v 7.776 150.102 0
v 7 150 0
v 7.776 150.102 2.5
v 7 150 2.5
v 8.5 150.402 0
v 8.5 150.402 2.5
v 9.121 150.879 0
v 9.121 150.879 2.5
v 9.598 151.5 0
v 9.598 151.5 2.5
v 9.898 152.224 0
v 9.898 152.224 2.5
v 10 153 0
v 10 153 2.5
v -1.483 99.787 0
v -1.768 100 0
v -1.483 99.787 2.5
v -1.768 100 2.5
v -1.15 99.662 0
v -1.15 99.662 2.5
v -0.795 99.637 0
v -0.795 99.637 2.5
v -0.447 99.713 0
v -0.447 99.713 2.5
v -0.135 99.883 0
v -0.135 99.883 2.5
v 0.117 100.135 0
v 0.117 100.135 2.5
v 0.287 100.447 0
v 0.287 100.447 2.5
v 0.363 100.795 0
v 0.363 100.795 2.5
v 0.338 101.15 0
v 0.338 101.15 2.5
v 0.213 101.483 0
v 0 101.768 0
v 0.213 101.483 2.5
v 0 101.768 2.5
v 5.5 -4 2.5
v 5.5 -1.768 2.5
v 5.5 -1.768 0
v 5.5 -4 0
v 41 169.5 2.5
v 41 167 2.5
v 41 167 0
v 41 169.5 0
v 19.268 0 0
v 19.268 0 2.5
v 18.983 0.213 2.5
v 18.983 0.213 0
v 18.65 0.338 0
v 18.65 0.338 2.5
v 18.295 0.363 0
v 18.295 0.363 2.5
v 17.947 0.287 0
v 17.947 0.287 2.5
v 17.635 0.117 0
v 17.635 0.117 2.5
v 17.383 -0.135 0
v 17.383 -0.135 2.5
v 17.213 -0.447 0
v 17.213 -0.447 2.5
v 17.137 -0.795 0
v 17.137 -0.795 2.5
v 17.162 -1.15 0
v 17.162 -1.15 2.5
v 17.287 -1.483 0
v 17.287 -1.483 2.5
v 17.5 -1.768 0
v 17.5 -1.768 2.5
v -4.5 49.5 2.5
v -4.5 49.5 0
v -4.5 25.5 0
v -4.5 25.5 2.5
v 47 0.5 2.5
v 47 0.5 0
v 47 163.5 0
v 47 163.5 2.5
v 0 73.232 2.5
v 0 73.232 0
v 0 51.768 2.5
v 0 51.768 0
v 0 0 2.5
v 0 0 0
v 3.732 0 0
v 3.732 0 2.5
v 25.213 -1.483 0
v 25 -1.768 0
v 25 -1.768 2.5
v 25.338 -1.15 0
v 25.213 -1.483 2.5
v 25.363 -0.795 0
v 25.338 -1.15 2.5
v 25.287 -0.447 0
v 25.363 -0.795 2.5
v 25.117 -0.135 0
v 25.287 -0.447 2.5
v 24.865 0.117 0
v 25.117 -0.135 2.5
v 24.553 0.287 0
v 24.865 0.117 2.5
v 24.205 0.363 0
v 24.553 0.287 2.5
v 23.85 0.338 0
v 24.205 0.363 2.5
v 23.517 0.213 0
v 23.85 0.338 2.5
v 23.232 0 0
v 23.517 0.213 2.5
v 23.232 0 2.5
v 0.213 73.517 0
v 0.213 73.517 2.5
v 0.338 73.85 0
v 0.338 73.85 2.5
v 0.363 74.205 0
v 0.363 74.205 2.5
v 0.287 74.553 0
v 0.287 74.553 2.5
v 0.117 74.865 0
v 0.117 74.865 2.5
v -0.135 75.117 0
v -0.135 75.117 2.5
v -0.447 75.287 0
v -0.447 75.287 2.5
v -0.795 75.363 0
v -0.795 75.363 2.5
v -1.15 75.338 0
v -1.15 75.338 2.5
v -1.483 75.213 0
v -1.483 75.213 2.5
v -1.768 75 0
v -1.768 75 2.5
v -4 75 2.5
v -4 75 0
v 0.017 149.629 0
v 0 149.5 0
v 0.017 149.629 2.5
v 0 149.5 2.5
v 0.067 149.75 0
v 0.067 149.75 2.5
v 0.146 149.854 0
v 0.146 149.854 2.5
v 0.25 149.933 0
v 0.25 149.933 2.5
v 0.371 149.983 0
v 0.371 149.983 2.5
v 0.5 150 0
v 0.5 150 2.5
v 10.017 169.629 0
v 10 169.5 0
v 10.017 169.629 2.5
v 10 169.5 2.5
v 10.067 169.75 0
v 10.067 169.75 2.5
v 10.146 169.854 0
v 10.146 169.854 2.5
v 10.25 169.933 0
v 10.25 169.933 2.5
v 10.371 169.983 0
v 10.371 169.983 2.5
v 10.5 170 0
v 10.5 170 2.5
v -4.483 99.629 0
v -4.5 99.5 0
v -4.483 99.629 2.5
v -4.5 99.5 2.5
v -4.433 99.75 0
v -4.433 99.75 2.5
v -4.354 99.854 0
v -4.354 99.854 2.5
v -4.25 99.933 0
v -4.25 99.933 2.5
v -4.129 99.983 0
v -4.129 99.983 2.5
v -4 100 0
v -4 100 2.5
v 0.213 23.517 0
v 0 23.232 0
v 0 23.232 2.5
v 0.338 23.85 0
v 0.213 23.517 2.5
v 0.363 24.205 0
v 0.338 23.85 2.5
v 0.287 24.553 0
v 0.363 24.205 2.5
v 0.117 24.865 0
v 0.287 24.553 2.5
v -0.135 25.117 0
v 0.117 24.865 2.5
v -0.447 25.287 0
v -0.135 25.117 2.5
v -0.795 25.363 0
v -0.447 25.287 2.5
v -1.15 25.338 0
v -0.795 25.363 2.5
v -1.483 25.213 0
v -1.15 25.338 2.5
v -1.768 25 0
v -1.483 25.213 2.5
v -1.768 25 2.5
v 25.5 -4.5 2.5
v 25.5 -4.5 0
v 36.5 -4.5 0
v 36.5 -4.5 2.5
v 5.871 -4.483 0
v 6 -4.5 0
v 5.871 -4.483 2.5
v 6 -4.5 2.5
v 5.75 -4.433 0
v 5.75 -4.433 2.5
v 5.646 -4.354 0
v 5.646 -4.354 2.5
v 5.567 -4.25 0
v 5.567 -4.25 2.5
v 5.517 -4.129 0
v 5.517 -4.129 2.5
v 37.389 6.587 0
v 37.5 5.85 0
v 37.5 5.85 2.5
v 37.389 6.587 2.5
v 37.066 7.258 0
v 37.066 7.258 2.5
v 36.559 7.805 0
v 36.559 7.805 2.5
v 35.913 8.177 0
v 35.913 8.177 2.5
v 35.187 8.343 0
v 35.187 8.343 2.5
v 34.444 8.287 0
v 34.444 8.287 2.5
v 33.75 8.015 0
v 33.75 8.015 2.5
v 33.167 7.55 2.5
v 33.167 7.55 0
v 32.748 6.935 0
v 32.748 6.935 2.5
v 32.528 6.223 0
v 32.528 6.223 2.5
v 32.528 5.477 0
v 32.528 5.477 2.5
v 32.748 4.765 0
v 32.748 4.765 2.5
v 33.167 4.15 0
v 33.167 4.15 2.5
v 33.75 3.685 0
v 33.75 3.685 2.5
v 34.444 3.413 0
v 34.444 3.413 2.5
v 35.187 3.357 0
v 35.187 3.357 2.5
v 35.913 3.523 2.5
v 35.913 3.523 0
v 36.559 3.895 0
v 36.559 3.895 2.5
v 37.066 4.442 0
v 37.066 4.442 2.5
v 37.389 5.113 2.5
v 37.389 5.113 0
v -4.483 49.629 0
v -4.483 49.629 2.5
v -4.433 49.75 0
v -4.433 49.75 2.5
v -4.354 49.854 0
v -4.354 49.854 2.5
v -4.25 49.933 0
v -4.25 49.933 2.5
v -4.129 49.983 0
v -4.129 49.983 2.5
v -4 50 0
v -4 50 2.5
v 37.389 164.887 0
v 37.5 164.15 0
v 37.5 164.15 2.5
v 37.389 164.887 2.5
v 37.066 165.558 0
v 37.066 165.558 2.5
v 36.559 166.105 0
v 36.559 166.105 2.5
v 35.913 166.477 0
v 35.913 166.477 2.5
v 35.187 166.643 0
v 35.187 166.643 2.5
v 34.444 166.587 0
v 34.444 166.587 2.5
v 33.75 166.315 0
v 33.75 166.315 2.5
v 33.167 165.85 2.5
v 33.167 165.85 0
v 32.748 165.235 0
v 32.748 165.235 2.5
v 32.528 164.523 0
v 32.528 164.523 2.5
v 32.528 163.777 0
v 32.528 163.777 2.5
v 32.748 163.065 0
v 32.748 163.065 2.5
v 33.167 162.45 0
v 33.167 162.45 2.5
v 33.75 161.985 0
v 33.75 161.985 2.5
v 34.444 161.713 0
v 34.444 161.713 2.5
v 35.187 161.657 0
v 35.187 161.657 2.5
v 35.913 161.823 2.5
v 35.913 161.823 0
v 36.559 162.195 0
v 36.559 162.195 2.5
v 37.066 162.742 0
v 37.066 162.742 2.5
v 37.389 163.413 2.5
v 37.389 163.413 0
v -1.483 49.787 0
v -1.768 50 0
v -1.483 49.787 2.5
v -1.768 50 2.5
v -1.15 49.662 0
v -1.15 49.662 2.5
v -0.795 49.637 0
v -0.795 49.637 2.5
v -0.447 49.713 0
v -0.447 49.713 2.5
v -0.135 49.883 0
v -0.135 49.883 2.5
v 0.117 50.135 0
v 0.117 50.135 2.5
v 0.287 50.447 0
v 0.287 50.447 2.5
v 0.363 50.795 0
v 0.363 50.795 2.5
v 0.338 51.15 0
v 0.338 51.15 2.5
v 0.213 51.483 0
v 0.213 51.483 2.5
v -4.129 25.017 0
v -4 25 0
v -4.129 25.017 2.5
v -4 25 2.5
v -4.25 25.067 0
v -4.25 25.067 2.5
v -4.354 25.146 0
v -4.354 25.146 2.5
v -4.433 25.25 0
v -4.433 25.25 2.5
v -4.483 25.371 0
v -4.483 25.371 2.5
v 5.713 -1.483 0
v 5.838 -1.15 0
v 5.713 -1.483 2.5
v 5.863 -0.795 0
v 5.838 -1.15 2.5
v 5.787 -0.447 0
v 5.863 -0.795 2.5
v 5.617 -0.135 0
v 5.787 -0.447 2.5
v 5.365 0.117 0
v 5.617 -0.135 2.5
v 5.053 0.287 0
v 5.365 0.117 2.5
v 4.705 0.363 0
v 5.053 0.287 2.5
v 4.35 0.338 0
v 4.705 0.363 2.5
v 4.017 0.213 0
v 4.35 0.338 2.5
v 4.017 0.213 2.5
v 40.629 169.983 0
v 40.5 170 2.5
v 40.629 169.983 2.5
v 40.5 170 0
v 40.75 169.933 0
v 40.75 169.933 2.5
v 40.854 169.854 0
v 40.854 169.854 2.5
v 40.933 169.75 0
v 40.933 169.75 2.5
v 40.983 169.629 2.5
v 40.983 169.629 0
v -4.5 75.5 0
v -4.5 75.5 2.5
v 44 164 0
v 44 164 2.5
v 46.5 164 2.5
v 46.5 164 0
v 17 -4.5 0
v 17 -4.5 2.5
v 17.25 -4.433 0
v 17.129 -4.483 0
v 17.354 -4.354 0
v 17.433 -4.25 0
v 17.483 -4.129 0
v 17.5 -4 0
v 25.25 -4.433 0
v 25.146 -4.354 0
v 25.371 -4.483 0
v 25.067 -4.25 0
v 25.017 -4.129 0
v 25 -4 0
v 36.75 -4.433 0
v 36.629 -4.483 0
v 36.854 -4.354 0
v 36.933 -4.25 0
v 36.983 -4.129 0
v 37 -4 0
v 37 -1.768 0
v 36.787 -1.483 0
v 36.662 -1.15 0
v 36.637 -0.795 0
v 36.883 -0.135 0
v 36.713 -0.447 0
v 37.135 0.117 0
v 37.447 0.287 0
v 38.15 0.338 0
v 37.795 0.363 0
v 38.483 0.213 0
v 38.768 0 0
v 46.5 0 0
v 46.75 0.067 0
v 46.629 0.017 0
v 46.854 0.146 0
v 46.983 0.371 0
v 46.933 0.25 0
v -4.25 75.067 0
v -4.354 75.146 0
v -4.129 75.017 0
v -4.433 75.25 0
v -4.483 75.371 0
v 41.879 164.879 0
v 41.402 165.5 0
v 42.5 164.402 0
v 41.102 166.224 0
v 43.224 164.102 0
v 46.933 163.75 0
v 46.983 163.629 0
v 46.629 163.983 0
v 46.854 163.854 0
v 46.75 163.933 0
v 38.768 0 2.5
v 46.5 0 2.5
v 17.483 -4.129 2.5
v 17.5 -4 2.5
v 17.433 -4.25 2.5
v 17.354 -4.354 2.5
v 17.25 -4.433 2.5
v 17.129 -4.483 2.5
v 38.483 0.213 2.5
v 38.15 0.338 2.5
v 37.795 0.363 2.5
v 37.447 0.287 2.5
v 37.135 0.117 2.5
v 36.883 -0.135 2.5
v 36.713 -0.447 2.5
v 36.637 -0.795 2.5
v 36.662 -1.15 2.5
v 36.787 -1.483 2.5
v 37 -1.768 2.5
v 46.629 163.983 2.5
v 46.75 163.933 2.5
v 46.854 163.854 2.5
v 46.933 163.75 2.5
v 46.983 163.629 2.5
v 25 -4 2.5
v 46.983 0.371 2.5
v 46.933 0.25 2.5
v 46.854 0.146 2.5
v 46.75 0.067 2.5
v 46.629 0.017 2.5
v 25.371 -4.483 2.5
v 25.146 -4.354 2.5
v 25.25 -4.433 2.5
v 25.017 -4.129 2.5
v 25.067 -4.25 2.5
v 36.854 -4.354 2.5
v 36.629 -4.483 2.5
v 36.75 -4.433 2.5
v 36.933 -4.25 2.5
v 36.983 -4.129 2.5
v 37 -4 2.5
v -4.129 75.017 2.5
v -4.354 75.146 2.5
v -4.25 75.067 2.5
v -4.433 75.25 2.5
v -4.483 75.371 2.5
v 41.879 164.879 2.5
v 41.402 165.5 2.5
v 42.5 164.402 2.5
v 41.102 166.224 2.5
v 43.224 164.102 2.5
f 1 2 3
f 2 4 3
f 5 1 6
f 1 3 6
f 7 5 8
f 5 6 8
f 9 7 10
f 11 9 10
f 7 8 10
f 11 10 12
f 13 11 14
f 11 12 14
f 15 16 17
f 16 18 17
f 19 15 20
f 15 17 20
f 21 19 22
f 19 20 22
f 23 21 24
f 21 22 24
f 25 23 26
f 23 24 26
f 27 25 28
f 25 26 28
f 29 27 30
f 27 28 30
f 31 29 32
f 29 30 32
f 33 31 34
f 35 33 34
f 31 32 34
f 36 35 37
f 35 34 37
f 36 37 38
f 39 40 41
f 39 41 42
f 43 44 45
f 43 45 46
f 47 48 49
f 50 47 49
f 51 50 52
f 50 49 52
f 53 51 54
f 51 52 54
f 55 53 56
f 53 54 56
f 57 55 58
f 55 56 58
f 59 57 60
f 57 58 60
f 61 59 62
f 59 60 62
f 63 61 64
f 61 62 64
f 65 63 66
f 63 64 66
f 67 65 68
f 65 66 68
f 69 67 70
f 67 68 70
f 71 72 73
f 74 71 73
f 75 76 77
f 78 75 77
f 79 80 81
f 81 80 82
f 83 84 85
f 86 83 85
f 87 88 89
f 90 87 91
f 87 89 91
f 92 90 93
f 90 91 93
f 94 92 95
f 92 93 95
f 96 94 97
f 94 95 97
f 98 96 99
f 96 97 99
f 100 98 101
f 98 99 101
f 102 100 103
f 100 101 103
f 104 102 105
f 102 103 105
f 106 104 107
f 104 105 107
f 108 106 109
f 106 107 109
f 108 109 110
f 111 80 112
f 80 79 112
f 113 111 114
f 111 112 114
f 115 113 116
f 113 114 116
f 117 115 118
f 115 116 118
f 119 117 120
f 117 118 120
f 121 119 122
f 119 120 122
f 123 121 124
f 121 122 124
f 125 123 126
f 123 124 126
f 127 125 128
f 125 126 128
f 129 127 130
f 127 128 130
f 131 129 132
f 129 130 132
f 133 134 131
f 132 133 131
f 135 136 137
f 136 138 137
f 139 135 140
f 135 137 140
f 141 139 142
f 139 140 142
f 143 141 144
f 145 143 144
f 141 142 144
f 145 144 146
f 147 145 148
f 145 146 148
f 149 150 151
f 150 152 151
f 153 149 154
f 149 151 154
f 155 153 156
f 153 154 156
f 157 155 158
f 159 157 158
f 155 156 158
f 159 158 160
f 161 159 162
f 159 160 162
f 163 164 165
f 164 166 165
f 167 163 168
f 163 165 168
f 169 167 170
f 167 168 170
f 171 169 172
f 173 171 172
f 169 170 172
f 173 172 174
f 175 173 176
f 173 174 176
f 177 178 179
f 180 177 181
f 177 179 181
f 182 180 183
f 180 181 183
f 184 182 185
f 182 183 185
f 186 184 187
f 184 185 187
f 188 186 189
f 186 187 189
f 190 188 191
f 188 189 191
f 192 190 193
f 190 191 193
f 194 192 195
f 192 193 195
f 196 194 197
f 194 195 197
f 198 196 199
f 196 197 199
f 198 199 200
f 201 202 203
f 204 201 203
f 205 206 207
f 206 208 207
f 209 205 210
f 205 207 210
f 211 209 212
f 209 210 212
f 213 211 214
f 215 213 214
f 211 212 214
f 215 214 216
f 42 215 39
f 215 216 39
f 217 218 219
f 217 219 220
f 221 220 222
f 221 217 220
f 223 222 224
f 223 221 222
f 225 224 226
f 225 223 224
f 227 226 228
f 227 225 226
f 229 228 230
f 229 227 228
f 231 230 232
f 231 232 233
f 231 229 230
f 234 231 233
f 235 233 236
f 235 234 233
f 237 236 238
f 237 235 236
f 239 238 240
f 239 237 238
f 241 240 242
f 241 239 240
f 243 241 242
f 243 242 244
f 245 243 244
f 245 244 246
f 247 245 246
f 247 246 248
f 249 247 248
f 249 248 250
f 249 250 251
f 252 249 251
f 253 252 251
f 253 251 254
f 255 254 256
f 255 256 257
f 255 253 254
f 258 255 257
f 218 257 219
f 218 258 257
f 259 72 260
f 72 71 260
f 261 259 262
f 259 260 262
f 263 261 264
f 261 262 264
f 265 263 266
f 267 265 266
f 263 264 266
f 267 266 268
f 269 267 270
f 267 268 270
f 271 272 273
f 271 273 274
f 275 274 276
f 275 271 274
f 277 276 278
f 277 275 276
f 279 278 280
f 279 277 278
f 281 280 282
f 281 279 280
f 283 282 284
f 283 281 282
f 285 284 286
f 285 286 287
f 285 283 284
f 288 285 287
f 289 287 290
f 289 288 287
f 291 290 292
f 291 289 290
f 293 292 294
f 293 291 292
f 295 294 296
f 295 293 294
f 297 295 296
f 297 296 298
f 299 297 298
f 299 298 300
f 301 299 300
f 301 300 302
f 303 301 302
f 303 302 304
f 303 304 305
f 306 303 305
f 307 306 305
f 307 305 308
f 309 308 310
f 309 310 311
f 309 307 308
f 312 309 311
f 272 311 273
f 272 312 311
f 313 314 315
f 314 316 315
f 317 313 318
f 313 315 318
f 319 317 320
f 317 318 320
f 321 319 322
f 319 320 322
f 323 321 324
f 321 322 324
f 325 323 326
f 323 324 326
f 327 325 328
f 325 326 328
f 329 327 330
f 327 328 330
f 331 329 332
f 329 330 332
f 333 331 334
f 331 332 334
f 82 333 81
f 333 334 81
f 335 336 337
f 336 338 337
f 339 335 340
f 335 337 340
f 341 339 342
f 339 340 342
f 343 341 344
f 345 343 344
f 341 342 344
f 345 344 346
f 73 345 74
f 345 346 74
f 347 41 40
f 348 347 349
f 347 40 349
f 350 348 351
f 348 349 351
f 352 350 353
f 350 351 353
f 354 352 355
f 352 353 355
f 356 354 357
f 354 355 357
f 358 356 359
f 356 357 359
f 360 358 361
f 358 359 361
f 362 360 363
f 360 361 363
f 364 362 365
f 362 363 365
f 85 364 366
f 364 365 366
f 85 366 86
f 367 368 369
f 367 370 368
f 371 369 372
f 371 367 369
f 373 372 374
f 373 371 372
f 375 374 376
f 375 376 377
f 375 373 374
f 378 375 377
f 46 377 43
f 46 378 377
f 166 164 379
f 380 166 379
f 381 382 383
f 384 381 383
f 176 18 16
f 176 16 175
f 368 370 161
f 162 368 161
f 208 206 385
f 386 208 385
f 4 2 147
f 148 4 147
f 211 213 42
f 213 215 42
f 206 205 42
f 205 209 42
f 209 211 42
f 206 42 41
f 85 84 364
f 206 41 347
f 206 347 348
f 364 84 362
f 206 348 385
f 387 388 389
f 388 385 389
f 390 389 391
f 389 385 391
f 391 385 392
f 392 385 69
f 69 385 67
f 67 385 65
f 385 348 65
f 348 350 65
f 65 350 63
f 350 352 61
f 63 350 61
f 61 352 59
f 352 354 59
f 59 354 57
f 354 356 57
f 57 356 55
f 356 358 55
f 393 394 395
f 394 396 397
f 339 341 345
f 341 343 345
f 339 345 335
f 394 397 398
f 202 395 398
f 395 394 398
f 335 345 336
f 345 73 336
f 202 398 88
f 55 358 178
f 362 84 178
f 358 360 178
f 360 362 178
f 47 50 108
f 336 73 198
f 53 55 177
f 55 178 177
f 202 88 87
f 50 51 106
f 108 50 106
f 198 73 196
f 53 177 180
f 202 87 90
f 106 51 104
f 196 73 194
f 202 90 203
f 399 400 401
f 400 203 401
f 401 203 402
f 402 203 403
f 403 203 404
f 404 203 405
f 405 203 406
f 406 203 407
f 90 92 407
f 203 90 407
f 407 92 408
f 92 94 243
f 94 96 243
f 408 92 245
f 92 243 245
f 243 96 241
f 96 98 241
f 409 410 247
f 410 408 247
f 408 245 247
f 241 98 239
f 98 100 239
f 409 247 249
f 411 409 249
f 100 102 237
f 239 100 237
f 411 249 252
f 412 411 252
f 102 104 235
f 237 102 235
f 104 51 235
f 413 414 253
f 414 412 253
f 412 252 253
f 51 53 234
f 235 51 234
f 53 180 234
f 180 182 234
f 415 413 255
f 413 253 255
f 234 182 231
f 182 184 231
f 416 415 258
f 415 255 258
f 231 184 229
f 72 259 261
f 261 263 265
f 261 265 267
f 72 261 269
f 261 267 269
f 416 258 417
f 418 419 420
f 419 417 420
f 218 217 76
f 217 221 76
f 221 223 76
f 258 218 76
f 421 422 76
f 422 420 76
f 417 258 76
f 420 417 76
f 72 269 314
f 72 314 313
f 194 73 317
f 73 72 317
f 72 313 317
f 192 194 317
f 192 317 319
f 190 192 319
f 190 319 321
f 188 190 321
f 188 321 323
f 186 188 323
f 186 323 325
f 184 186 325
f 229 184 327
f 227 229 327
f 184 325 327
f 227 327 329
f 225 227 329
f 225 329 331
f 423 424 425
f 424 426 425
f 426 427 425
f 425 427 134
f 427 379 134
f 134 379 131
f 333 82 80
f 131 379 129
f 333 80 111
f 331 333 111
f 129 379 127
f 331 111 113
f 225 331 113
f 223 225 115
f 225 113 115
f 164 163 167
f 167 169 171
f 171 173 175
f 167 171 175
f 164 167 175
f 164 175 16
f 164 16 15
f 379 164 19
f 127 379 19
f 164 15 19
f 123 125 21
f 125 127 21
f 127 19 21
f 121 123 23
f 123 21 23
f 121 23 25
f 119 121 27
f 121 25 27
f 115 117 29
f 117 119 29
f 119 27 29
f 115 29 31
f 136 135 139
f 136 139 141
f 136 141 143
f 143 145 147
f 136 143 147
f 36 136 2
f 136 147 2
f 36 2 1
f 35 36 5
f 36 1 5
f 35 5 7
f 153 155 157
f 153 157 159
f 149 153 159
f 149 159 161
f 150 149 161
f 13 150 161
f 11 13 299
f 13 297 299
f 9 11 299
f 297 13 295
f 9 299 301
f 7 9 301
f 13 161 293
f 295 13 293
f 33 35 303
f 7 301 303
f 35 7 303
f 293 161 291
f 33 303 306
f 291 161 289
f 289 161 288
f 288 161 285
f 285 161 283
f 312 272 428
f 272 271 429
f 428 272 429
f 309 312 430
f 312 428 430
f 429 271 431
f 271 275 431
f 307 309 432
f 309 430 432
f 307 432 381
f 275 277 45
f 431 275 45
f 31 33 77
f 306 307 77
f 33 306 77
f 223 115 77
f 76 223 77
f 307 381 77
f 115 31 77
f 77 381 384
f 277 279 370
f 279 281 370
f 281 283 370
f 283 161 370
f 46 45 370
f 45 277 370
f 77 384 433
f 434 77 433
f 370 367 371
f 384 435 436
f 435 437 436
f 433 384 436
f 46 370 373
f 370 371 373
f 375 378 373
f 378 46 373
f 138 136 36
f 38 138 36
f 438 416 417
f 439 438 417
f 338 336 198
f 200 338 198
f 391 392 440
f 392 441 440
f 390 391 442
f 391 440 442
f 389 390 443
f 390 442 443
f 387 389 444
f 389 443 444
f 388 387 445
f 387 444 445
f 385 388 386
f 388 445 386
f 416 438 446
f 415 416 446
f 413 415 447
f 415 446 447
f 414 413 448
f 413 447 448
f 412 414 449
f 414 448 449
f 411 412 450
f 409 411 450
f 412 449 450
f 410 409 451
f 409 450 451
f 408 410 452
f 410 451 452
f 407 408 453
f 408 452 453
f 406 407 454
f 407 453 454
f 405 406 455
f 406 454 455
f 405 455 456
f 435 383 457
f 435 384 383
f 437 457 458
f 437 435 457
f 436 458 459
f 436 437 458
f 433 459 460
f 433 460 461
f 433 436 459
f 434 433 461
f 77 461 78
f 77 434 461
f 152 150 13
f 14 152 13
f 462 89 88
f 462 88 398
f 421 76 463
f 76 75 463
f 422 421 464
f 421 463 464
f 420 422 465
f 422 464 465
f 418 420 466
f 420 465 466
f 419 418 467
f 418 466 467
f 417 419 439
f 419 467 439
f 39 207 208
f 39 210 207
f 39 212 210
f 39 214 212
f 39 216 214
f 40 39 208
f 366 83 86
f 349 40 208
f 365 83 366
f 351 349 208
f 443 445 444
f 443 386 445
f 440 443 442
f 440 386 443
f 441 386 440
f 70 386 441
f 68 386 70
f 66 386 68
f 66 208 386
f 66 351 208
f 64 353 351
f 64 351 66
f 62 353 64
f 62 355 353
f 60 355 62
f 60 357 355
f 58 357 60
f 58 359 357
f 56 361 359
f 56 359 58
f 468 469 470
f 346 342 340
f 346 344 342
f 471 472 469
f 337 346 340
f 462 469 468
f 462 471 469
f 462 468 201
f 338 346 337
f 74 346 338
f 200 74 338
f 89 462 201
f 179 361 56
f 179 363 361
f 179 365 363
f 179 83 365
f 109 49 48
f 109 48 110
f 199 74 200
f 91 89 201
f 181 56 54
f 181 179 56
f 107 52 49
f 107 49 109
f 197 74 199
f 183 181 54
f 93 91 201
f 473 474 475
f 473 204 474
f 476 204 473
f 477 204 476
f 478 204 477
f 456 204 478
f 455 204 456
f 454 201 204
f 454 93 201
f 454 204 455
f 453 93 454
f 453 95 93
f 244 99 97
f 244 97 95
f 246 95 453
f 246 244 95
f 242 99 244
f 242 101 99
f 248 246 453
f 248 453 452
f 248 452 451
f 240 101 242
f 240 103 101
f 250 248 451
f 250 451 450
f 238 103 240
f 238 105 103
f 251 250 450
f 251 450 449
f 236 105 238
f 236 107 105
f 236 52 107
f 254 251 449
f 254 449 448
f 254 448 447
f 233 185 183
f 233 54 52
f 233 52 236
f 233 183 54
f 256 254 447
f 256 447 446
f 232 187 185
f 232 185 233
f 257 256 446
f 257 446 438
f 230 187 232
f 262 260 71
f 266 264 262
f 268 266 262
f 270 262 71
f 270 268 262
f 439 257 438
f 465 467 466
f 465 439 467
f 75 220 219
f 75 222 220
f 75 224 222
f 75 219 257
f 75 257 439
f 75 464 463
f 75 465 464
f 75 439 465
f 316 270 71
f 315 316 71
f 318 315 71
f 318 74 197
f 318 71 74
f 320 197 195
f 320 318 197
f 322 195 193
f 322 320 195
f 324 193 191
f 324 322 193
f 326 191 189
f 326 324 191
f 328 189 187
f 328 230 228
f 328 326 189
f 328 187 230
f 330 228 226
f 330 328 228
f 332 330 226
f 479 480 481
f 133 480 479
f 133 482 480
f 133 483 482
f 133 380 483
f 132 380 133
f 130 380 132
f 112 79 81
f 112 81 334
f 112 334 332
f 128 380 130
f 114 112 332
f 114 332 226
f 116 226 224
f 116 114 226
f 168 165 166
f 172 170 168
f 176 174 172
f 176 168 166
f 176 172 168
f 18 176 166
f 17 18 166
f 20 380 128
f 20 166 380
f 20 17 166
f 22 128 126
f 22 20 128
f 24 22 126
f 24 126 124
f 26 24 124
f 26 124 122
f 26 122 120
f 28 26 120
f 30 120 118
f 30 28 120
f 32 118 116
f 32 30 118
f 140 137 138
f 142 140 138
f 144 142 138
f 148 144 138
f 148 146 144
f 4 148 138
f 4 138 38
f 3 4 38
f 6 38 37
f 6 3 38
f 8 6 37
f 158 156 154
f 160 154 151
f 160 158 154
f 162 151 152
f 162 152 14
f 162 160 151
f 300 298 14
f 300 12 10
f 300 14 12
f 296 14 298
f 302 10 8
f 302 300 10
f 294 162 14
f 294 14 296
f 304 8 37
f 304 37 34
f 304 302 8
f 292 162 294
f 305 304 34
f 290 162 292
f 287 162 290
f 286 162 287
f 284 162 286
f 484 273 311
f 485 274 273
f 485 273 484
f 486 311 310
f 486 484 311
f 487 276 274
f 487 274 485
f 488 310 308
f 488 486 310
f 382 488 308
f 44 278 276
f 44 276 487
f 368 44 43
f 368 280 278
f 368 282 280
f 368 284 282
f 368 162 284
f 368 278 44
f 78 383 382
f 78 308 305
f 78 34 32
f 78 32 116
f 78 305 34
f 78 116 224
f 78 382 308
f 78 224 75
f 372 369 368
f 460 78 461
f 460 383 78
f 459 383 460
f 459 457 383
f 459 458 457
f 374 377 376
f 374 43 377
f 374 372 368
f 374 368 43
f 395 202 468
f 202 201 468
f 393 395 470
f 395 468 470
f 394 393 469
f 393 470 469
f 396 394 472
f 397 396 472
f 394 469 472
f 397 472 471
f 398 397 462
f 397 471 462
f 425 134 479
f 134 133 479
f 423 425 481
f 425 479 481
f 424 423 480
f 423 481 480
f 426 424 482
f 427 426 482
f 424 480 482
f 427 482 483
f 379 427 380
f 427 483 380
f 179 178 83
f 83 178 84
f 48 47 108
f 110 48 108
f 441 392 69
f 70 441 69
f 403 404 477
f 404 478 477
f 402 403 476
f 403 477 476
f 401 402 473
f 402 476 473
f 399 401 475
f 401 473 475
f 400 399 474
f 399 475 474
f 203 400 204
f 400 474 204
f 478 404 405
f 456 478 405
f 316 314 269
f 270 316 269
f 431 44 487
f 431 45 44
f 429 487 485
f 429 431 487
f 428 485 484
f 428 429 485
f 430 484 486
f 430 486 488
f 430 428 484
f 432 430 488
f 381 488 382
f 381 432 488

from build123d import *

# Parameters (mm, degrees)
SKETCH1_R           = 2.5
BOSS_EXTRUDE1_DEPTH = 2.5
SKETCH3_W           = 6
SKETCH3_H           = 6
CUT_EXTRUDE2_DEPTH  = 177.395152995
SKETCH2_R           = 1.25
CUT_EXTRUDE1_DEPTH  = 177.395152995
FILLET1_R           = 0.5
FILLET2_R           = 3


with BuildPart() as part:
    # Sketch1 → Boss-Extrude1 (new body)
    with BuildSketch(Plane.XY):
        Polygon((0, 0), (5.5, 0), (5.5, -4.5), (17.5, -4.5), (17.5, 0), (25, 0), (25, -4.5), (37, -4.5), (37, 0), (47, 0), (47, 170), (10, 170), (10, 150), (0, 150), (0, 100), (-4.5, 100), (-4.5, 75), (0, 75), (0, 50), (-4.5, 50), (-4.5, 25), (0, 25), align=None)
        with Locations((35, 5.85)):
            Circle(SKETCH1_R, mode=Mode.SUBTRACT)
        with Locations((35, 164.15)):
            Circle(SKETCH1_R, mode=Mode.SUBTRACT)
    extrude(amount=BOSS_EXTRUDE1_DEPTH)

    # Sketch3 → Cut-Extrude2 (cut, through all)
    with BuildSketch(Plane.XY.offset(2.5)):
        with Locations((44, 167)):
            Rectangle(SKETCH3_W, SKETCH3_H)
    extrude(amount=-CUT_EXTRUDE2_DEPTH, mode=Mode.SUBTRACT)

    # Sketch2 → Cut-Extrude1 (cut, through all)
    with BuildSketch(Plane.XY.offset(2.5)):
        with Locations((-0.883883476, 24.116116524)):
            Circle(SKETCH2_R)
        with Locations((-0.883883476, 50.883883476)):
            Circle(SKETCH2_R)
        with Locations((-0.883883476, 74.116116524)):
            Circle(SKETCH2_R)
        with Locations((-0.883883476, 100.883883476)):
            Circle(SKETCH2_R)
        with Locations((4.616116524, -0.883883476)):
            Circle(SKETCH2_R)
        with Locations((18.383883476, -0.883883476)):
            Circle(SKETCH2_R)
        with Locations((24.116116524, -0.883883476)):
            Circle(SKETCH2_R)
        with Locations((37.883883476, -0.883883476)):
            Circle(SKETCH2_R)
    extrude(amount=-CUT_EXTRUDE1_DEPTH, mode=Mode.SUBTRACT)

    # Fillet1
    fillet1_edges = [part.edges().sort_by_distance(p)[0] for p in [
        (-4.5, 25, 1.25),
        (-4.5, 50, 1.25),
        (-4.5, 75, 1.25),
        (-4.5, 100, 1.25),
        (0, 150, 1.25),
        (10, 170, 1.25),
        (47, 0, 1.25),
        (37, -4.5, 1.25),
        (25, -4.5, 1.25),
        (17.5, -4.5, 1.25),
        (5.5, -4.5, 1.25),
        (41, 170, 1.25),
        (47, 164, 1.25),
    ]]
    fillet(fillet1_edges, radius=FILLET1_R)

    # Fillet2
    fillet2_edges = [part.edges().sort_by_distance(p)[0] for p in [
        (10, 150, 1.25),
        (41, 164, 1.25),
    ]]
    fillet(fillet2_edges, radius=FILLET2_R)


solid = part.part
